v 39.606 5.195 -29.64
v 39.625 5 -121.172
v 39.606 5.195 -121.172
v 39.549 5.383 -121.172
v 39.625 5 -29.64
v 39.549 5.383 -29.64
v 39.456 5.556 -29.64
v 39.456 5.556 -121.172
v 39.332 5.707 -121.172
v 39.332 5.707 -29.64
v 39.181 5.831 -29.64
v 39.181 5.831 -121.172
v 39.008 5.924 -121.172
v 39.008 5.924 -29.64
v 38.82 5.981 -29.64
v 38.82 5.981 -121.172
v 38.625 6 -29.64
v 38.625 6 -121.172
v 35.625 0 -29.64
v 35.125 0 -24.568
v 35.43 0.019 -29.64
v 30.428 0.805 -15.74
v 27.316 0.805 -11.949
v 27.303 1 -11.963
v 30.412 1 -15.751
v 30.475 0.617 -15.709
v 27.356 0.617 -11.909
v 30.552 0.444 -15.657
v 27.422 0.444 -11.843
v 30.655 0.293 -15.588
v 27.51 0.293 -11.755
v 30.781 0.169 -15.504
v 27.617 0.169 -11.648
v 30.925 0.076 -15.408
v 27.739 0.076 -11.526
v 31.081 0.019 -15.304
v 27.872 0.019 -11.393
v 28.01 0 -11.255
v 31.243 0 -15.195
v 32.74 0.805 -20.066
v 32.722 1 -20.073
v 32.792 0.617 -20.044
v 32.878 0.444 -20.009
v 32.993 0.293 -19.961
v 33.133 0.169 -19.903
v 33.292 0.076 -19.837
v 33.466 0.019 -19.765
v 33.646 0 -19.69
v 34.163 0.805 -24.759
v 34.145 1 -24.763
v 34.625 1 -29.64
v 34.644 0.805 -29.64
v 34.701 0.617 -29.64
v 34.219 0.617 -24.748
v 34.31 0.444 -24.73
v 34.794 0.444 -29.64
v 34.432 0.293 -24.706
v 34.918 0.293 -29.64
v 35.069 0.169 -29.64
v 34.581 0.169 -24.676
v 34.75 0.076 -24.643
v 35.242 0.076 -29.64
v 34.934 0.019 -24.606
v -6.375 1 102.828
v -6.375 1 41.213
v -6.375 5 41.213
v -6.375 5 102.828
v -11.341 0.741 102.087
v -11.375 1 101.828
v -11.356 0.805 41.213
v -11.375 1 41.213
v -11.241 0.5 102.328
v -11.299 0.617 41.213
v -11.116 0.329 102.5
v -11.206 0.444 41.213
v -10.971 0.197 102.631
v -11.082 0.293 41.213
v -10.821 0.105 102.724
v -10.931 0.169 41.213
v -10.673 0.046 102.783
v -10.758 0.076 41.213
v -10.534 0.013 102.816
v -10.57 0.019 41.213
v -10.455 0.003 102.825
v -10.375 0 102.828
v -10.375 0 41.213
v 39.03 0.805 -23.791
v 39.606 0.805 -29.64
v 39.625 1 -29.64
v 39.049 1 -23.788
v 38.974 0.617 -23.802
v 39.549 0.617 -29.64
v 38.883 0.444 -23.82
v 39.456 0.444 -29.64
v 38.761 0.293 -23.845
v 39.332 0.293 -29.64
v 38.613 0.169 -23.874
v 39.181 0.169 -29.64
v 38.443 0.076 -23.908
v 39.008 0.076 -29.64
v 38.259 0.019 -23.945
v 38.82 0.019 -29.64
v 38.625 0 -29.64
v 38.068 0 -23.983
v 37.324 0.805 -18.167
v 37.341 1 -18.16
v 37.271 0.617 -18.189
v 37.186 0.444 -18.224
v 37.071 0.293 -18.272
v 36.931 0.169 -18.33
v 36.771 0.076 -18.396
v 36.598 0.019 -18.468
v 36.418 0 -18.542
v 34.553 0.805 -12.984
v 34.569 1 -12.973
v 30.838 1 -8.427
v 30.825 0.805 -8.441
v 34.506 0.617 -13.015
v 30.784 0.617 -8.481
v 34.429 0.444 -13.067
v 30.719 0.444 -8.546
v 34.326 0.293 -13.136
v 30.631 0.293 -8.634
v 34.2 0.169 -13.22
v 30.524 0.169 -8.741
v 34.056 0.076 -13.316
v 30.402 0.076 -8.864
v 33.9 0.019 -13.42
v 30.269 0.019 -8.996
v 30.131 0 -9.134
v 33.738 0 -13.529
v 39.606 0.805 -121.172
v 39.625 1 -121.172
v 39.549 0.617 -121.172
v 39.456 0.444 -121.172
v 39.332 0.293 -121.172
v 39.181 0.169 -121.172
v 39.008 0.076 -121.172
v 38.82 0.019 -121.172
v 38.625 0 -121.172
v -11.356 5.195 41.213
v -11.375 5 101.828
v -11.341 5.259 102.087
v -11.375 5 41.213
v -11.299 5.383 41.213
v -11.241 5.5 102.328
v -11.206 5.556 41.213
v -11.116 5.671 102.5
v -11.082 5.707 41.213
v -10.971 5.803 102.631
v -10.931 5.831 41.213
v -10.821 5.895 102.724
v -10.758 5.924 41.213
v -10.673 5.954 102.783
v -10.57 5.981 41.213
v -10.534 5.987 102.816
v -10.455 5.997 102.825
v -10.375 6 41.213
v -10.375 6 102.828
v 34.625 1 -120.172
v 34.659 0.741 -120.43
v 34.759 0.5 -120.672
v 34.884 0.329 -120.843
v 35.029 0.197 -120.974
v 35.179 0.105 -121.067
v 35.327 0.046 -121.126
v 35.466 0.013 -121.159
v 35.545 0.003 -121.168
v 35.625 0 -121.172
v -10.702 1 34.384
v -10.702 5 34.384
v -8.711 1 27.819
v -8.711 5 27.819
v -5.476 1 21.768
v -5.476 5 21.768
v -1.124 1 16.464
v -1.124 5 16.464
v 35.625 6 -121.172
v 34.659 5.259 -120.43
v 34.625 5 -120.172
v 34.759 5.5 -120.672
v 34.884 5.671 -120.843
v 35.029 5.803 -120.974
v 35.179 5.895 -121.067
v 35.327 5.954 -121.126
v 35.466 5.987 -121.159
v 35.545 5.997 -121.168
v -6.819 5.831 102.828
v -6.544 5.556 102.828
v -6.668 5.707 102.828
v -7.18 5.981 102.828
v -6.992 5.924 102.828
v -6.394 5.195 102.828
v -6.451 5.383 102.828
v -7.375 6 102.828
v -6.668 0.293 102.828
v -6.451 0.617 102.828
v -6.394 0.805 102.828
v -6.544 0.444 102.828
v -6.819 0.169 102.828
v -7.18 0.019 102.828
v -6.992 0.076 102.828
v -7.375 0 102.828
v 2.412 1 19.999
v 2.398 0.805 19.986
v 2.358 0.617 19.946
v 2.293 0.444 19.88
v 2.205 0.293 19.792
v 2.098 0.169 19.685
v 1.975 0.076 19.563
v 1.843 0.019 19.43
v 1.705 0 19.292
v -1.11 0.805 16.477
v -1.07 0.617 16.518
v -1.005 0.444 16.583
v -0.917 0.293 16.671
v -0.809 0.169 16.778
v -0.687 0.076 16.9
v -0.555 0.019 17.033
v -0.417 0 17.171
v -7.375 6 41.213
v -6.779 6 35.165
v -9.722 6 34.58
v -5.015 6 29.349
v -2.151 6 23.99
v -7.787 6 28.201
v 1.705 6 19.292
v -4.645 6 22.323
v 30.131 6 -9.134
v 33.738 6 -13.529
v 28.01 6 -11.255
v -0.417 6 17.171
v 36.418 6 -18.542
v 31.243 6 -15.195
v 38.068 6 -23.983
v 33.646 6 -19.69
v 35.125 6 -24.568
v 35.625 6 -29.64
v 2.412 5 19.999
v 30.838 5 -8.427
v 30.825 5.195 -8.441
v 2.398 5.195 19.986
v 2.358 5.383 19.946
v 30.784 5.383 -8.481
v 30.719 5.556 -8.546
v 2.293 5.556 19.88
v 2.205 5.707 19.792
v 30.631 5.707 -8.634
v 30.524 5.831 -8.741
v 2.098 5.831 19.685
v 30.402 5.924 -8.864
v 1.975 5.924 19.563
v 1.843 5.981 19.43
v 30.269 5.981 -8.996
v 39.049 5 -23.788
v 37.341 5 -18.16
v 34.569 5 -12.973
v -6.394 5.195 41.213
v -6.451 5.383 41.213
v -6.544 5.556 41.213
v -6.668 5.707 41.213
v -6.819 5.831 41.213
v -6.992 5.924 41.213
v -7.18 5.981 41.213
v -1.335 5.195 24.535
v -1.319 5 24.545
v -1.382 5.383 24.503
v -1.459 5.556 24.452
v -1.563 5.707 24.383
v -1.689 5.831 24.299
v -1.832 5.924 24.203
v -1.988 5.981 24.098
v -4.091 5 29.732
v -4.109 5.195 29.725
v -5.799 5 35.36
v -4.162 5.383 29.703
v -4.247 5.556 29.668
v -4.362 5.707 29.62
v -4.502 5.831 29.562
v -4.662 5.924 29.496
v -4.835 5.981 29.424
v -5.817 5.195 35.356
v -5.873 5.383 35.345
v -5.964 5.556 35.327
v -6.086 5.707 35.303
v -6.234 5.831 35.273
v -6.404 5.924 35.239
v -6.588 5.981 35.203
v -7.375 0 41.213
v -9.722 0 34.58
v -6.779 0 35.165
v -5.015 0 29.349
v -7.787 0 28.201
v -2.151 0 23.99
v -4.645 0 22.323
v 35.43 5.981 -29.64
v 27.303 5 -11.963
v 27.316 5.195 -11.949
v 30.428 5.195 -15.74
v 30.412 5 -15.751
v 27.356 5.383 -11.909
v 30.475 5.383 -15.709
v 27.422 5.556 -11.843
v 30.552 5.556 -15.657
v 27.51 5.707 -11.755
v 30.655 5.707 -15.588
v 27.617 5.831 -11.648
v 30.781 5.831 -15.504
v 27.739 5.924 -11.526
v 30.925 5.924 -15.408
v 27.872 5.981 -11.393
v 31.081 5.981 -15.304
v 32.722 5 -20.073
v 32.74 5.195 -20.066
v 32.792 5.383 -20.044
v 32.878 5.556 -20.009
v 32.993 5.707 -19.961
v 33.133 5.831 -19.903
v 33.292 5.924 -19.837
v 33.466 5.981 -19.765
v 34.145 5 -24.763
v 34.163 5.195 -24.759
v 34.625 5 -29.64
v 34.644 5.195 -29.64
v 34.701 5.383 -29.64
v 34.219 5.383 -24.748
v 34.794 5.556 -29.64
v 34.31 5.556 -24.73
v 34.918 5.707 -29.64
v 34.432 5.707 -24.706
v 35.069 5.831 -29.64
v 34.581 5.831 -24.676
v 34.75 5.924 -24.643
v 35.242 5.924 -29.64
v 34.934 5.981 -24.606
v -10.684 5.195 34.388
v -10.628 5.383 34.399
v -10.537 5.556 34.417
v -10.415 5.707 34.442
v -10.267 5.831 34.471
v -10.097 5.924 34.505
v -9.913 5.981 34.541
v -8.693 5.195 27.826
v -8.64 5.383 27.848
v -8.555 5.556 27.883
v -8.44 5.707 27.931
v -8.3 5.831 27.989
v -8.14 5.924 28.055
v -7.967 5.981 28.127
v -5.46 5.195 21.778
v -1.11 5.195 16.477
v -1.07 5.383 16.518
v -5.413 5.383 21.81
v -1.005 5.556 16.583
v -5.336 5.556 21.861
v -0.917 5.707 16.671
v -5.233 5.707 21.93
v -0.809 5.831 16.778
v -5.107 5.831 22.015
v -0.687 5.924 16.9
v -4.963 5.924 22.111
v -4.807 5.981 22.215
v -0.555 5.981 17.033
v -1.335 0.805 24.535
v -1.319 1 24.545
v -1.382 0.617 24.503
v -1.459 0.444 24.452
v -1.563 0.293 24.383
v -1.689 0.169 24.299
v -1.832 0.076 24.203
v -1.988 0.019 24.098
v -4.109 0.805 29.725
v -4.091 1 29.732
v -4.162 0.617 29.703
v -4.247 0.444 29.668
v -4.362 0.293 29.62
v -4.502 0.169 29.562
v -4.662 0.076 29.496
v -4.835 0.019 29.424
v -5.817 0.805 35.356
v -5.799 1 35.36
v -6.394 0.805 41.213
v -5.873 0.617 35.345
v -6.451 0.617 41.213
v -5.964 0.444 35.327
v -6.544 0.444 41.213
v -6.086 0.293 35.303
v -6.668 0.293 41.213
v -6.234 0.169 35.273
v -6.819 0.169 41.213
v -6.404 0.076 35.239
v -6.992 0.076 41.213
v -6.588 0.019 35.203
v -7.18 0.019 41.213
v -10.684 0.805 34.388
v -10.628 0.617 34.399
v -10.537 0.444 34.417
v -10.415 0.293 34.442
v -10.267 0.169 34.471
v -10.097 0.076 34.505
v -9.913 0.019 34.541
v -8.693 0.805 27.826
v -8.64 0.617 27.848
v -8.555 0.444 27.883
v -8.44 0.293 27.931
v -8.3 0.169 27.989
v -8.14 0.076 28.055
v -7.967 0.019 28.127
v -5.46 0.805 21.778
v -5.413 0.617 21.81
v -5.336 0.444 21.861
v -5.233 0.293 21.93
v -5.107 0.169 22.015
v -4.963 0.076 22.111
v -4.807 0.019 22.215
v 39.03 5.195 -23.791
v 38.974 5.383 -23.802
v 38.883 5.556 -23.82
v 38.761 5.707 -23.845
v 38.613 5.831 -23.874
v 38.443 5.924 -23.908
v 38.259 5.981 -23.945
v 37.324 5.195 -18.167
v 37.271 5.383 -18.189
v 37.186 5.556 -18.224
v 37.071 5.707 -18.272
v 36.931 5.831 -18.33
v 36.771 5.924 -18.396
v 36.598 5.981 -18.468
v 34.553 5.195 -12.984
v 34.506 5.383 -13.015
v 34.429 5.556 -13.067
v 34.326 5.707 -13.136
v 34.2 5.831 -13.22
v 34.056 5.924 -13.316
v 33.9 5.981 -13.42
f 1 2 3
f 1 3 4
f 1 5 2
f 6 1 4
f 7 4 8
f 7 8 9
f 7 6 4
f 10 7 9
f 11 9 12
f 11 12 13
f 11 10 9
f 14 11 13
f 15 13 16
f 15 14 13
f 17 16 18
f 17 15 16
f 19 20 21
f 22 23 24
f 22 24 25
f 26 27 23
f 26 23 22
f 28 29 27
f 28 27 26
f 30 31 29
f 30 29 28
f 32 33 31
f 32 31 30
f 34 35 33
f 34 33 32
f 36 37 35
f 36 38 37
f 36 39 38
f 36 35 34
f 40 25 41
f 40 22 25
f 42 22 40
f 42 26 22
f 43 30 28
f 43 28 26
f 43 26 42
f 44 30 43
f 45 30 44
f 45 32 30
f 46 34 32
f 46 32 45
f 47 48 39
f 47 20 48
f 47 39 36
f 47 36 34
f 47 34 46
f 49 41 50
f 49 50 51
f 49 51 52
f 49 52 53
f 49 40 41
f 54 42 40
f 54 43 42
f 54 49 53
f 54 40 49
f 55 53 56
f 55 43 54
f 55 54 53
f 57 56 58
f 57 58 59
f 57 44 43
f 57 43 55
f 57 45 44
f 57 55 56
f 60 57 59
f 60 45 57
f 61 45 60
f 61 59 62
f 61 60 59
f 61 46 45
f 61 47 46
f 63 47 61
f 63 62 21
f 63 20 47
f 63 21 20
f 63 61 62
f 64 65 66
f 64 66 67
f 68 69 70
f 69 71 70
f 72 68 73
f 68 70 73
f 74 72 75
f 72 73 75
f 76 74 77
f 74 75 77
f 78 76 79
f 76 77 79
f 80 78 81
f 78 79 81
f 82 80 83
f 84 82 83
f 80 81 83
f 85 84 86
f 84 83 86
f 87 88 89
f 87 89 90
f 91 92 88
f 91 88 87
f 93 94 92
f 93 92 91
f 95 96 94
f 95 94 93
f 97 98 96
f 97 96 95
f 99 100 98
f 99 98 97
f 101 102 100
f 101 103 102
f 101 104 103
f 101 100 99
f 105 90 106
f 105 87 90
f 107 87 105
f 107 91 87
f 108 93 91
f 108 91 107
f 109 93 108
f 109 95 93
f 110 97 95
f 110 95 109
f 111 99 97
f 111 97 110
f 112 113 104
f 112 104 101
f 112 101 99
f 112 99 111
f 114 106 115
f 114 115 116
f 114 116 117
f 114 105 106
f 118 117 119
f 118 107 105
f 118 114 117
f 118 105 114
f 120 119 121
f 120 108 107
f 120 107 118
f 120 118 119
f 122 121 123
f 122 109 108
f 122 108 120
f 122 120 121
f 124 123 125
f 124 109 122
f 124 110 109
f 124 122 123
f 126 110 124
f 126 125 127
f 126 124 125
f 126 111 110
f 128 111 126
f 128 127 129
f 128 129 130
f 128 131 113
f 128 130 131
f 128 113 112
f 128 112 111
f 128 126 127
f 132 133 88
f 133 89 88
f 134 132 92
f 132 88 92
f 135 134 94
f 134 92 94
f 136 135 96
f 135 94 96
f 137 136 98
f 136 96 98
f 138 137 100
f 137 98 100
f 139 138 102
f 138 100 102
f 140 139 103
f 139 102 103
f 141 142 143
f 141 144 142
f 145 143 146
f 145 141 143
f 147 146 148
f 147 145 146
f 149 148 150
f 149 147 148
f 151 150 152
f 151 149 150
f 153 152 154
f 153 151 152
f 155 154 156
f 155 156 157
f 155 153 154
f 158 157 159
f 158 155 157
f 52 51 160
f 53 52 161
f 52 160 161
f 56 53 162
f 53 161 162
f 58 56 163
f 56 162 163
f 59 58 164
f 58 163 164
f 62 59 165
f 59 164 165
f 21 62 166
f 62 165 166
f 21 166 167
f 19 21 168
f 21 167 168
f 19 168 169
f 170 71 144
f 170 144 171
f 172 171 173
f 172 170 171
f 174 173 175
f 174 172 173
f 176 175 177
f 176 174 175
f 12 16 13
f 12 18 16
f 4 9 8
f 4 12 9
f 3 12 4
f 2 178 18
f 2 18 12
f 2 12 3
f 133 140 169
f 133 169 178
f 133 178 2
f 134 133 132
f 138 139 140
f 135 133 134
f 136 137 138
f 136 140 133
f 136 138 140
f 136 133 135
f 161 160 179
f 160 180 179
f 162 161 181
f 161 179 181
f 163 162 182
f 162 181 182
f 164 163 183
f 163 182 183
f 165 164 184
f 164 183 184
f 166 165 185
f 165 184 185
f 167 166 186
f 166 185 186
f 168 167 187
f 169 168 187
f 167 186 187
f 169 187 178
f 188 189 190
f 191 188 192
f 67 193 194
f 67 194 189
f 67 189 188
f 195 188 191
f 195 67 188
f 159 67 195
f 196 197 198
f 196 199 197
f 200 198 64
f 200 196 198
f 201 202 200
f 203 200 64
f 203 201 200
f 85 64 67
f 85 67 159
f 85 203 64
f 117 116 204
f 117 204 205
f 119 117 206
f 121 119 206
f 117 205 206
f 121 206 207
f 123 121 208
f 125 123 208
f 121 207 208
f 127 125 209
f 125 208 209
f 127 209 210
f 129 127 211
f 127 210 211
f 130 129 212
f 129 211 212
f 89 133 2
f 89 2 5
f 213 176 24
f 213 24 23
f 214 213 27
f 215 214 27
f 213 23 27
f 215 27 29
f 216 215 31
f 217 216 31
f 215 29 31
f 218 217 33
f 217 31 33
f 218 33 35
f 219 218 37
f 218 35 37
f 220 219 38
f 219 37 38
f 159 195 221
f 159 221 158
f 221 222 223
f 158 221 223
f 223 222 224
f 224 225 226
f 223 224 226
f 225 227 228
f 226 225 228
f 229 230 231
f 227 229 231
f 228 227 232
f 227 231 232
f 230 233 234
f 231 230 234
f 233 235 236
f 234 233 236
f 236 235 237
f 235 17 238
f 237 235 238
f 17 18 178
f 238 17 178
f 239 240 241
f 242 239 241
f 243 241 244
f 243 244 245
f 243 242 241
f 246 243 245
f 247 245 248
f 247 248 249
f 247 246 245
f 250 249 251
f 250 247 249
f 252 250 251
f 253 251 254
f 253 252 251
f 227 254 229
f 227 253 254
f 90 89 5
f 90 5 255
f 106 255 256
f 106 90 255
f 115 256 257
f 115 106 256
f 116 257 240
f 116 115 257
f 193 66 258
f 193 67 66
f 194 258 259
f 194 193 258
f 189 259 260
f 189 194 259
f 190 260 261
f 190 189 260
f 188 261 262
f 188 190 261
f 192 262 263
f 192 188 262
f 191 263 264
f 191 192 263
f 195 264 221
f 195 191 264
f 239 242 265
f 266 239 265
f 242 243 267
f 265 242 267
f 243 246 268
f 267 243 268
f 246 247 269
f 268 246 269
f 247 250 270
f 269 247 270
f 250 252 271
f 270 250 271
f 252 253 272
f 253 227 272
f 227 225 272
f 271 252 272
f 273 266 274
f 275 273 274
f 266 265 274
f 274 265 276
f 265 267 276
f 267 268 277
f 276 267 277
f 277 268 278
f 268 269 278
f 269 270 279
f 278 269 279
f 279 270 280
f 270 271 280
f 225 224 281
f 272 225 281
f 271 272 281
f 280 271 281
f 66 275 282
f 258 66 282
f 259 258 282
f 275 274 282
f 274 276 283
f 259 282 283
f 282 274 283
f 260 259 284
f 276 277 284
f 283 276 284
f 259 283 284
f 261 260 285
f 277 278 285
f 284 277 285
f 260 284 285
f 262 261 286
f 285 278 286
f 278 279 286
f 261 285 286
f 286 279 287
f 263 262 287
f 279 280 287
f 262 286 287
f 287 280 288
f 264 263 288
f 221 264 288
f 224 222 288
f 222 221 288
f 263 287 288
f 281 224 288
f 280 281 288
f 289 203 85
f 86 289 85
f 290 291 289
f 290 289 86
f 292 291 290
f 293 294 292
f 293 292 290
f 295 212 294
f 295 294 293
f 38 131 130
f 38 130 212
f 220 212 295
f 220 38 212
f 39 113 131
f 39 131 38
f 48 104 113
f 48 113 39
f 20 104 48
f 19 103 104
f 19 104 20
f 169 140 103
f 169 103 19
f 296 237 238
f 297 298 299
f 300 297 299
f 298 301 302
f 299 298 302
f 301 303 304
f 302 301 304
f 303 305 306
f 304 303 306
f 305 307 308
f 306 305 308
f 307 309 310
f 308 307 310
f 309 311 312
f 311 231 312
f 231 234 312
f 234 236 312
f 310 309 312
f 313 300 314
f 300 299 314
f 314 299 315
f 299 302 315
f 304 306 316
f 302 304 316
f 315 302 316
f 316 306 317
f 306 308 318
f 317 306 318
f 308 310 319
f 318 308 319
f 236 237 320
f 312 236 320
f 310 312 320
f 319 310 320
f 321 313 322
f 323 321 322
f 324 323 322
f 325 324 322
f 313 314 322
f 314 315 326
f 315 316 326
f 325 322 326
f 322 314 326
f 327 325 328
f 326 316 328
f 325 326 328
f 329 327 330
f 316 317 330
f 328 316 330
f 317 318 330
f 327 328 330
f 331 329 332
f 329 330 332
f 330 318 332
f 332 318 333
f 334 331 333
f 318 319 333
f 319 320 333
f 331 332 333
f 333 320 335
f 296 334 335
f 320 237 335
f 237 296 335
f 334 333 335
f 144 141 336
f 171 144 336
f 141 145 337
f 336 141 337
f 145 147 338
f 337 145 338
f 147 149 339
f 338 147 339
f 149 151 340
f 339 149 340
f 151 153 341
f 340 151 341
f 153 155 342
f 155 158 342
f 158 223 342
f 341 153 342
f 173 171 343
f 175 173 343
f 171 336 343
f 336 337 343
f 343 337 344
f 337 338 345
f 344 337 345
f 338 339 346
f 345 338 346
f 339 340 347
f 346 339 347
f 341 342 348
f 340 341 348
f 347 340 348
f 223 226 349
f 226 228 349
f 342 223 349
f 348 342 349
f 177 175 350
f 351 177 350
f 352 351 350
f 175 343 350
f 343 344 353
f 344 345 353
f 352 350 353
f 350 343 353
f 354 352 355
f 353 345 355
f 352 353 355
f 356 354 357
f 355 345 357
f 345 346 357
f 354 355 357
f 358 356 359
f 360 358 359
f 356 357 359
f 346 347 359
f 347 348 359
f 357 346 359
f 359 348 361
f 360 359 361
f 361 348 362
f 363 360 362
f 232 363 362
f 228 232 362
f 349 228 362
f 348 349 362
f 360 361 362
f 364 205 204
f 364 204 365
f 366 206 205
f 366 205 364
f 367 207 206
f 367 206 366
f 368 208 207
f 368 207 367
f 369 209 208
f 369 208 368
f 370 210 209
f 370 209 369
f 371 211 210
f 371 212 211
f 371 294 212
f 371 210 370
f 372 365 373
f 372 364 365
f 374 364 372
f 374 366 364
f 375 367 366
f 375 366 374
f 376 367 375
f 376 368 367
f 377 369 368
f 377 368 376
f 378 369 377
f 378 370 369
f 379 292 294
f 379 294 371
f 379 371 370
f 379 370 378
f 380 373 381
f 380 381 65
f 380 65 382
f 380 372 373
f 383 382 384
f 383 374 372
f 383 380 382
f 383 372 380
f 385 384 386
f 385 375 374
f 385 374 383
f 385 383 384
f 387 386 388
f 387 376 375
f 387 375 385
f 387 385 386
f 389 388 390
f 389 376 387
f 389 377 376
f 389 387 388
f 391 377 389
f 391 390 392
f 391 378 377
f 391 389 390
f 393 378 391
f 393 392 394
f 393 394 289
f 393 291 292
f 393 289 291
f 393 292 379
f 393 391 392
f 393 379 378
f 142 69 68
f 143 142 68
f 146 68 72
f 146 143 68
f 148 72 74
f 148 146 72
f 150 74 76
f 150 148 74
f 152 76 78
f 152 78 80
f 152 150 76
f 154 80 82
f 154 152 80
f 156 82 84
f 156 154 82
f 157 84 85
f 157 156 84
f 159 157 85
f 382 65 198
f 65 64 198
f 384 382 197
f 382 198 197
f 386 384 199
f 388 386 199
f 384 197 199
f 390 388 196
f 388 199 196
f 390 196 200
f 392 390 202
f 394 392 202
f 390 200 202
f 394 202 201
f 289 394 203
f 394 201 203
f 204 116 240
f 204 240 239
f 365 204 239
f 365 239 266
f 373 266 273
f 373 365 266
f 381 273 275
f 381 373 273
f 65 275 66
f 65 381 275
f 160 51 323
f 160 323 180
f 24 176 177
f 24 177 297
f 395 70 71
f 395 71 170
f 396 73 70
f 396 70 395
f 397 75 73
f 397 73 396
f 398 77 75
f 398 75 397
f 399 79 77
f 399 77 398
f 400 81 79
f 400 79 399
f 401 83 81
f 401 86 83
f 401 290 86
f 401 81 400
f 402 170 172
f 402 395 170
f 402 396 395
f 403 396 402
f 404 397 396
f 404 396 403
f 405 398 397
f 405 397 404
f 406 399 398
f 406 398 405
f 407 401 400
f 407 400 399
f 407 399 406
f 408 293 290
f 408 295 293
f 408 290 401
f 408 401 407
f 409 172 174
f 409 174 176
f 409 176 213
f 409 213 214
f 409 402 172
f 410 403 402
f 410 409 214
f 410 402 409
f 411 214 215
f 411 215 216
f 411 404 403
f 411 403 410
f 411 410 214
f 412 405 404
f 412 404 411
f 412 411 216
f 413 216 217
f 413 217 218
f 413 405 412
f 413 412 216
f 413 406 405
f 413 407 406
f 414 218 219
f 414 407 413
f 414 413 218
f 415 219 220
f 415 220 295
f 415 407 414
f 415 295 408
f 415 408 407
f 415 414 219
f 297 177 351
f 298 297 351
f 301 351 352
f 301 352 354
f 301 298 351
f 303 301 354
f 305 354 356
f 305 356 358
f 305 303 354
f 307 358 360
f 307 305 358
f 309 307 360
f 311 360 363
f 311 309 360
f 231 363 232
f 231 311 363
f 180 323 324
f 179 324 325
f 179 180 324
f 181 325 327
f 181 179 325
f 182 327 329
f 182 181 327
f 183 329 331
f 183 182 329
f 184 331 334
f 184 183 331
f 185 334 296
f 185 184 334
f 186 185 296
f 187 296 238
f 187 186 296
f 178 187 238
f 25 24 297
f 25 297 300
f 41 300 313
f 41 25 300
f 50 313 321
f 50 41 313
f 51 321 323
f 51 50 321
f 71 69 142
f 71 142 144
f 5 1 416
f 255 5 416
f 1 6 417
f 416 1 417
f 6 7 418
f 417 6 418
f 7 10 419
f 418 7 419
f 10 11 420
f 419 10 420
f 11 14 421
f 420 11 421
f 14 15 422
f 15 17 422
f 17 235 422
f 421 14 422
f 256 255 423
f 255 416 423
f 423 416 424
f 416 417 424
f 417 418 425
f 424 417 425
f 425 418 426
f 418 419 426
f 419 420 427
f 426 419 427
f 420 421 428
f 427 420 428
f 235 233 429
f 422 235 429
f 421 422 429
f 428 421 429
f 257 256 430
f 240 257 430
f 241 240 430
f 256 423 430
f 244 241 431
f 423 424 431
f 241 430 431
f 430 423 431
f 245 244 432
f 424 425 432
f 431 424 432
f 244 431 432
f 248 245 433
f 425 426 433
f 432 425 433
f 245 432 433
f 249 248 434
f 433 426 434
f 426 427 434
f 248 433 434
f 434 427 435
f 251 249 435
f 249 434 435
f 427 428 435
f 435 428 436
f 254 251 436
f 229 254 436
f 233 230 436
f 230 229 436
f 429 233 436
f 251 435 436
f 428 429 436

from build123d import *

# Parameters (mm, degrees)
RESSALTO_EXTRUS_O1_DEPTH = 6
FILETE1_R                = 1


with BuildPart() as part:
    # Esboço2 → Ressalto-extrusão1 (new body)
    with BuildSketch(Plane(origin=(0, 0, 0), x_dir=(1, 0, 0), z_dir=(0, 1, 0))):
        with BuildLine():
            Line((-11.375, -102.828494661), (-11.375, -41.212577741))
            ThreePointArc((-11.375, -41.212577741), (-8.710783638, -27.818657608), (-1.123737342, -16.463840399))
            Line((-1.123737342, -16.463840399), (27.30266953, 11.962566472))
            ThreePointArc((27.30266953, 11.962566472), (32.721988313, 20.073150192), (34.625, 29.640236002))
            Line((34.625, 29.640236002), (34.625, 121.17150534))
            Line((34.625, 121.17150534), (39.625, 121.17150534))
            Line((39.625, 121.17150534), (39.625, 29.640236002))
            ThreePointArc((39.625, 29.640236002), (37.341385975, 18.159733031), (30.838203436, 8.427032566))
            Line((30.838203436, 8.427032566), (2.411796564, -19.999374305))
            ThreePointArc((2.411796564, -19.999374305), (-4.091385975, -29.73207477), (-6.375, -41.212577741))
            Line((-6.375, -41.212577741), (-6.375, -102.828494661))
            Line((-6.375, -102.828494661), (-11.375, -102.828494661))
        make_face()
    extrude(amount=RESSALTO_EXTRUS_O1_DEPTH)

    # Filete1
    filete1_edges = [part.edges().sort_by_distance(p)[0] for p in [
        (39.625, 0, -75.405870671),
        (37.341385975, 0, -18.159733031),
        (32.721988313, 6, -20.073150192),
        (16.625, 0, 5.78617087),
        (-4.091385975, 0, 29.73207477),
        (-6.375, 0, 72.020536201),
        (-11.375, 0, 72.020536201),
        (-8.710783638, 0, 27.818657608),
        (13.089466094, 0, 2.250636964),
        (32.721988313, 0, -20.073150192),
        (34.625, 0, -75.405870671),
        (13.089466094, 6, 2.250636964),
        (-8.710783638, 6, 27.818657608),
        (-11.375, 3, 102.828494661),
        (34.625, 3, -121.17150534),
        (-11.375, 6, 72.020536201),
        (-6.375, 6, 72.020536201),
        (-4.091385975, 6, 29.73207477),
        (16.625, 6, 5.78617087),
        (37.341385975, 6, -18.159733031),
        (39.625, 6, -75.405870671),
        (34.625, 6, -75.405870671),
    ]]
    fillet(filete1_edges, radius=FILETE1_R)


solid = part.part
